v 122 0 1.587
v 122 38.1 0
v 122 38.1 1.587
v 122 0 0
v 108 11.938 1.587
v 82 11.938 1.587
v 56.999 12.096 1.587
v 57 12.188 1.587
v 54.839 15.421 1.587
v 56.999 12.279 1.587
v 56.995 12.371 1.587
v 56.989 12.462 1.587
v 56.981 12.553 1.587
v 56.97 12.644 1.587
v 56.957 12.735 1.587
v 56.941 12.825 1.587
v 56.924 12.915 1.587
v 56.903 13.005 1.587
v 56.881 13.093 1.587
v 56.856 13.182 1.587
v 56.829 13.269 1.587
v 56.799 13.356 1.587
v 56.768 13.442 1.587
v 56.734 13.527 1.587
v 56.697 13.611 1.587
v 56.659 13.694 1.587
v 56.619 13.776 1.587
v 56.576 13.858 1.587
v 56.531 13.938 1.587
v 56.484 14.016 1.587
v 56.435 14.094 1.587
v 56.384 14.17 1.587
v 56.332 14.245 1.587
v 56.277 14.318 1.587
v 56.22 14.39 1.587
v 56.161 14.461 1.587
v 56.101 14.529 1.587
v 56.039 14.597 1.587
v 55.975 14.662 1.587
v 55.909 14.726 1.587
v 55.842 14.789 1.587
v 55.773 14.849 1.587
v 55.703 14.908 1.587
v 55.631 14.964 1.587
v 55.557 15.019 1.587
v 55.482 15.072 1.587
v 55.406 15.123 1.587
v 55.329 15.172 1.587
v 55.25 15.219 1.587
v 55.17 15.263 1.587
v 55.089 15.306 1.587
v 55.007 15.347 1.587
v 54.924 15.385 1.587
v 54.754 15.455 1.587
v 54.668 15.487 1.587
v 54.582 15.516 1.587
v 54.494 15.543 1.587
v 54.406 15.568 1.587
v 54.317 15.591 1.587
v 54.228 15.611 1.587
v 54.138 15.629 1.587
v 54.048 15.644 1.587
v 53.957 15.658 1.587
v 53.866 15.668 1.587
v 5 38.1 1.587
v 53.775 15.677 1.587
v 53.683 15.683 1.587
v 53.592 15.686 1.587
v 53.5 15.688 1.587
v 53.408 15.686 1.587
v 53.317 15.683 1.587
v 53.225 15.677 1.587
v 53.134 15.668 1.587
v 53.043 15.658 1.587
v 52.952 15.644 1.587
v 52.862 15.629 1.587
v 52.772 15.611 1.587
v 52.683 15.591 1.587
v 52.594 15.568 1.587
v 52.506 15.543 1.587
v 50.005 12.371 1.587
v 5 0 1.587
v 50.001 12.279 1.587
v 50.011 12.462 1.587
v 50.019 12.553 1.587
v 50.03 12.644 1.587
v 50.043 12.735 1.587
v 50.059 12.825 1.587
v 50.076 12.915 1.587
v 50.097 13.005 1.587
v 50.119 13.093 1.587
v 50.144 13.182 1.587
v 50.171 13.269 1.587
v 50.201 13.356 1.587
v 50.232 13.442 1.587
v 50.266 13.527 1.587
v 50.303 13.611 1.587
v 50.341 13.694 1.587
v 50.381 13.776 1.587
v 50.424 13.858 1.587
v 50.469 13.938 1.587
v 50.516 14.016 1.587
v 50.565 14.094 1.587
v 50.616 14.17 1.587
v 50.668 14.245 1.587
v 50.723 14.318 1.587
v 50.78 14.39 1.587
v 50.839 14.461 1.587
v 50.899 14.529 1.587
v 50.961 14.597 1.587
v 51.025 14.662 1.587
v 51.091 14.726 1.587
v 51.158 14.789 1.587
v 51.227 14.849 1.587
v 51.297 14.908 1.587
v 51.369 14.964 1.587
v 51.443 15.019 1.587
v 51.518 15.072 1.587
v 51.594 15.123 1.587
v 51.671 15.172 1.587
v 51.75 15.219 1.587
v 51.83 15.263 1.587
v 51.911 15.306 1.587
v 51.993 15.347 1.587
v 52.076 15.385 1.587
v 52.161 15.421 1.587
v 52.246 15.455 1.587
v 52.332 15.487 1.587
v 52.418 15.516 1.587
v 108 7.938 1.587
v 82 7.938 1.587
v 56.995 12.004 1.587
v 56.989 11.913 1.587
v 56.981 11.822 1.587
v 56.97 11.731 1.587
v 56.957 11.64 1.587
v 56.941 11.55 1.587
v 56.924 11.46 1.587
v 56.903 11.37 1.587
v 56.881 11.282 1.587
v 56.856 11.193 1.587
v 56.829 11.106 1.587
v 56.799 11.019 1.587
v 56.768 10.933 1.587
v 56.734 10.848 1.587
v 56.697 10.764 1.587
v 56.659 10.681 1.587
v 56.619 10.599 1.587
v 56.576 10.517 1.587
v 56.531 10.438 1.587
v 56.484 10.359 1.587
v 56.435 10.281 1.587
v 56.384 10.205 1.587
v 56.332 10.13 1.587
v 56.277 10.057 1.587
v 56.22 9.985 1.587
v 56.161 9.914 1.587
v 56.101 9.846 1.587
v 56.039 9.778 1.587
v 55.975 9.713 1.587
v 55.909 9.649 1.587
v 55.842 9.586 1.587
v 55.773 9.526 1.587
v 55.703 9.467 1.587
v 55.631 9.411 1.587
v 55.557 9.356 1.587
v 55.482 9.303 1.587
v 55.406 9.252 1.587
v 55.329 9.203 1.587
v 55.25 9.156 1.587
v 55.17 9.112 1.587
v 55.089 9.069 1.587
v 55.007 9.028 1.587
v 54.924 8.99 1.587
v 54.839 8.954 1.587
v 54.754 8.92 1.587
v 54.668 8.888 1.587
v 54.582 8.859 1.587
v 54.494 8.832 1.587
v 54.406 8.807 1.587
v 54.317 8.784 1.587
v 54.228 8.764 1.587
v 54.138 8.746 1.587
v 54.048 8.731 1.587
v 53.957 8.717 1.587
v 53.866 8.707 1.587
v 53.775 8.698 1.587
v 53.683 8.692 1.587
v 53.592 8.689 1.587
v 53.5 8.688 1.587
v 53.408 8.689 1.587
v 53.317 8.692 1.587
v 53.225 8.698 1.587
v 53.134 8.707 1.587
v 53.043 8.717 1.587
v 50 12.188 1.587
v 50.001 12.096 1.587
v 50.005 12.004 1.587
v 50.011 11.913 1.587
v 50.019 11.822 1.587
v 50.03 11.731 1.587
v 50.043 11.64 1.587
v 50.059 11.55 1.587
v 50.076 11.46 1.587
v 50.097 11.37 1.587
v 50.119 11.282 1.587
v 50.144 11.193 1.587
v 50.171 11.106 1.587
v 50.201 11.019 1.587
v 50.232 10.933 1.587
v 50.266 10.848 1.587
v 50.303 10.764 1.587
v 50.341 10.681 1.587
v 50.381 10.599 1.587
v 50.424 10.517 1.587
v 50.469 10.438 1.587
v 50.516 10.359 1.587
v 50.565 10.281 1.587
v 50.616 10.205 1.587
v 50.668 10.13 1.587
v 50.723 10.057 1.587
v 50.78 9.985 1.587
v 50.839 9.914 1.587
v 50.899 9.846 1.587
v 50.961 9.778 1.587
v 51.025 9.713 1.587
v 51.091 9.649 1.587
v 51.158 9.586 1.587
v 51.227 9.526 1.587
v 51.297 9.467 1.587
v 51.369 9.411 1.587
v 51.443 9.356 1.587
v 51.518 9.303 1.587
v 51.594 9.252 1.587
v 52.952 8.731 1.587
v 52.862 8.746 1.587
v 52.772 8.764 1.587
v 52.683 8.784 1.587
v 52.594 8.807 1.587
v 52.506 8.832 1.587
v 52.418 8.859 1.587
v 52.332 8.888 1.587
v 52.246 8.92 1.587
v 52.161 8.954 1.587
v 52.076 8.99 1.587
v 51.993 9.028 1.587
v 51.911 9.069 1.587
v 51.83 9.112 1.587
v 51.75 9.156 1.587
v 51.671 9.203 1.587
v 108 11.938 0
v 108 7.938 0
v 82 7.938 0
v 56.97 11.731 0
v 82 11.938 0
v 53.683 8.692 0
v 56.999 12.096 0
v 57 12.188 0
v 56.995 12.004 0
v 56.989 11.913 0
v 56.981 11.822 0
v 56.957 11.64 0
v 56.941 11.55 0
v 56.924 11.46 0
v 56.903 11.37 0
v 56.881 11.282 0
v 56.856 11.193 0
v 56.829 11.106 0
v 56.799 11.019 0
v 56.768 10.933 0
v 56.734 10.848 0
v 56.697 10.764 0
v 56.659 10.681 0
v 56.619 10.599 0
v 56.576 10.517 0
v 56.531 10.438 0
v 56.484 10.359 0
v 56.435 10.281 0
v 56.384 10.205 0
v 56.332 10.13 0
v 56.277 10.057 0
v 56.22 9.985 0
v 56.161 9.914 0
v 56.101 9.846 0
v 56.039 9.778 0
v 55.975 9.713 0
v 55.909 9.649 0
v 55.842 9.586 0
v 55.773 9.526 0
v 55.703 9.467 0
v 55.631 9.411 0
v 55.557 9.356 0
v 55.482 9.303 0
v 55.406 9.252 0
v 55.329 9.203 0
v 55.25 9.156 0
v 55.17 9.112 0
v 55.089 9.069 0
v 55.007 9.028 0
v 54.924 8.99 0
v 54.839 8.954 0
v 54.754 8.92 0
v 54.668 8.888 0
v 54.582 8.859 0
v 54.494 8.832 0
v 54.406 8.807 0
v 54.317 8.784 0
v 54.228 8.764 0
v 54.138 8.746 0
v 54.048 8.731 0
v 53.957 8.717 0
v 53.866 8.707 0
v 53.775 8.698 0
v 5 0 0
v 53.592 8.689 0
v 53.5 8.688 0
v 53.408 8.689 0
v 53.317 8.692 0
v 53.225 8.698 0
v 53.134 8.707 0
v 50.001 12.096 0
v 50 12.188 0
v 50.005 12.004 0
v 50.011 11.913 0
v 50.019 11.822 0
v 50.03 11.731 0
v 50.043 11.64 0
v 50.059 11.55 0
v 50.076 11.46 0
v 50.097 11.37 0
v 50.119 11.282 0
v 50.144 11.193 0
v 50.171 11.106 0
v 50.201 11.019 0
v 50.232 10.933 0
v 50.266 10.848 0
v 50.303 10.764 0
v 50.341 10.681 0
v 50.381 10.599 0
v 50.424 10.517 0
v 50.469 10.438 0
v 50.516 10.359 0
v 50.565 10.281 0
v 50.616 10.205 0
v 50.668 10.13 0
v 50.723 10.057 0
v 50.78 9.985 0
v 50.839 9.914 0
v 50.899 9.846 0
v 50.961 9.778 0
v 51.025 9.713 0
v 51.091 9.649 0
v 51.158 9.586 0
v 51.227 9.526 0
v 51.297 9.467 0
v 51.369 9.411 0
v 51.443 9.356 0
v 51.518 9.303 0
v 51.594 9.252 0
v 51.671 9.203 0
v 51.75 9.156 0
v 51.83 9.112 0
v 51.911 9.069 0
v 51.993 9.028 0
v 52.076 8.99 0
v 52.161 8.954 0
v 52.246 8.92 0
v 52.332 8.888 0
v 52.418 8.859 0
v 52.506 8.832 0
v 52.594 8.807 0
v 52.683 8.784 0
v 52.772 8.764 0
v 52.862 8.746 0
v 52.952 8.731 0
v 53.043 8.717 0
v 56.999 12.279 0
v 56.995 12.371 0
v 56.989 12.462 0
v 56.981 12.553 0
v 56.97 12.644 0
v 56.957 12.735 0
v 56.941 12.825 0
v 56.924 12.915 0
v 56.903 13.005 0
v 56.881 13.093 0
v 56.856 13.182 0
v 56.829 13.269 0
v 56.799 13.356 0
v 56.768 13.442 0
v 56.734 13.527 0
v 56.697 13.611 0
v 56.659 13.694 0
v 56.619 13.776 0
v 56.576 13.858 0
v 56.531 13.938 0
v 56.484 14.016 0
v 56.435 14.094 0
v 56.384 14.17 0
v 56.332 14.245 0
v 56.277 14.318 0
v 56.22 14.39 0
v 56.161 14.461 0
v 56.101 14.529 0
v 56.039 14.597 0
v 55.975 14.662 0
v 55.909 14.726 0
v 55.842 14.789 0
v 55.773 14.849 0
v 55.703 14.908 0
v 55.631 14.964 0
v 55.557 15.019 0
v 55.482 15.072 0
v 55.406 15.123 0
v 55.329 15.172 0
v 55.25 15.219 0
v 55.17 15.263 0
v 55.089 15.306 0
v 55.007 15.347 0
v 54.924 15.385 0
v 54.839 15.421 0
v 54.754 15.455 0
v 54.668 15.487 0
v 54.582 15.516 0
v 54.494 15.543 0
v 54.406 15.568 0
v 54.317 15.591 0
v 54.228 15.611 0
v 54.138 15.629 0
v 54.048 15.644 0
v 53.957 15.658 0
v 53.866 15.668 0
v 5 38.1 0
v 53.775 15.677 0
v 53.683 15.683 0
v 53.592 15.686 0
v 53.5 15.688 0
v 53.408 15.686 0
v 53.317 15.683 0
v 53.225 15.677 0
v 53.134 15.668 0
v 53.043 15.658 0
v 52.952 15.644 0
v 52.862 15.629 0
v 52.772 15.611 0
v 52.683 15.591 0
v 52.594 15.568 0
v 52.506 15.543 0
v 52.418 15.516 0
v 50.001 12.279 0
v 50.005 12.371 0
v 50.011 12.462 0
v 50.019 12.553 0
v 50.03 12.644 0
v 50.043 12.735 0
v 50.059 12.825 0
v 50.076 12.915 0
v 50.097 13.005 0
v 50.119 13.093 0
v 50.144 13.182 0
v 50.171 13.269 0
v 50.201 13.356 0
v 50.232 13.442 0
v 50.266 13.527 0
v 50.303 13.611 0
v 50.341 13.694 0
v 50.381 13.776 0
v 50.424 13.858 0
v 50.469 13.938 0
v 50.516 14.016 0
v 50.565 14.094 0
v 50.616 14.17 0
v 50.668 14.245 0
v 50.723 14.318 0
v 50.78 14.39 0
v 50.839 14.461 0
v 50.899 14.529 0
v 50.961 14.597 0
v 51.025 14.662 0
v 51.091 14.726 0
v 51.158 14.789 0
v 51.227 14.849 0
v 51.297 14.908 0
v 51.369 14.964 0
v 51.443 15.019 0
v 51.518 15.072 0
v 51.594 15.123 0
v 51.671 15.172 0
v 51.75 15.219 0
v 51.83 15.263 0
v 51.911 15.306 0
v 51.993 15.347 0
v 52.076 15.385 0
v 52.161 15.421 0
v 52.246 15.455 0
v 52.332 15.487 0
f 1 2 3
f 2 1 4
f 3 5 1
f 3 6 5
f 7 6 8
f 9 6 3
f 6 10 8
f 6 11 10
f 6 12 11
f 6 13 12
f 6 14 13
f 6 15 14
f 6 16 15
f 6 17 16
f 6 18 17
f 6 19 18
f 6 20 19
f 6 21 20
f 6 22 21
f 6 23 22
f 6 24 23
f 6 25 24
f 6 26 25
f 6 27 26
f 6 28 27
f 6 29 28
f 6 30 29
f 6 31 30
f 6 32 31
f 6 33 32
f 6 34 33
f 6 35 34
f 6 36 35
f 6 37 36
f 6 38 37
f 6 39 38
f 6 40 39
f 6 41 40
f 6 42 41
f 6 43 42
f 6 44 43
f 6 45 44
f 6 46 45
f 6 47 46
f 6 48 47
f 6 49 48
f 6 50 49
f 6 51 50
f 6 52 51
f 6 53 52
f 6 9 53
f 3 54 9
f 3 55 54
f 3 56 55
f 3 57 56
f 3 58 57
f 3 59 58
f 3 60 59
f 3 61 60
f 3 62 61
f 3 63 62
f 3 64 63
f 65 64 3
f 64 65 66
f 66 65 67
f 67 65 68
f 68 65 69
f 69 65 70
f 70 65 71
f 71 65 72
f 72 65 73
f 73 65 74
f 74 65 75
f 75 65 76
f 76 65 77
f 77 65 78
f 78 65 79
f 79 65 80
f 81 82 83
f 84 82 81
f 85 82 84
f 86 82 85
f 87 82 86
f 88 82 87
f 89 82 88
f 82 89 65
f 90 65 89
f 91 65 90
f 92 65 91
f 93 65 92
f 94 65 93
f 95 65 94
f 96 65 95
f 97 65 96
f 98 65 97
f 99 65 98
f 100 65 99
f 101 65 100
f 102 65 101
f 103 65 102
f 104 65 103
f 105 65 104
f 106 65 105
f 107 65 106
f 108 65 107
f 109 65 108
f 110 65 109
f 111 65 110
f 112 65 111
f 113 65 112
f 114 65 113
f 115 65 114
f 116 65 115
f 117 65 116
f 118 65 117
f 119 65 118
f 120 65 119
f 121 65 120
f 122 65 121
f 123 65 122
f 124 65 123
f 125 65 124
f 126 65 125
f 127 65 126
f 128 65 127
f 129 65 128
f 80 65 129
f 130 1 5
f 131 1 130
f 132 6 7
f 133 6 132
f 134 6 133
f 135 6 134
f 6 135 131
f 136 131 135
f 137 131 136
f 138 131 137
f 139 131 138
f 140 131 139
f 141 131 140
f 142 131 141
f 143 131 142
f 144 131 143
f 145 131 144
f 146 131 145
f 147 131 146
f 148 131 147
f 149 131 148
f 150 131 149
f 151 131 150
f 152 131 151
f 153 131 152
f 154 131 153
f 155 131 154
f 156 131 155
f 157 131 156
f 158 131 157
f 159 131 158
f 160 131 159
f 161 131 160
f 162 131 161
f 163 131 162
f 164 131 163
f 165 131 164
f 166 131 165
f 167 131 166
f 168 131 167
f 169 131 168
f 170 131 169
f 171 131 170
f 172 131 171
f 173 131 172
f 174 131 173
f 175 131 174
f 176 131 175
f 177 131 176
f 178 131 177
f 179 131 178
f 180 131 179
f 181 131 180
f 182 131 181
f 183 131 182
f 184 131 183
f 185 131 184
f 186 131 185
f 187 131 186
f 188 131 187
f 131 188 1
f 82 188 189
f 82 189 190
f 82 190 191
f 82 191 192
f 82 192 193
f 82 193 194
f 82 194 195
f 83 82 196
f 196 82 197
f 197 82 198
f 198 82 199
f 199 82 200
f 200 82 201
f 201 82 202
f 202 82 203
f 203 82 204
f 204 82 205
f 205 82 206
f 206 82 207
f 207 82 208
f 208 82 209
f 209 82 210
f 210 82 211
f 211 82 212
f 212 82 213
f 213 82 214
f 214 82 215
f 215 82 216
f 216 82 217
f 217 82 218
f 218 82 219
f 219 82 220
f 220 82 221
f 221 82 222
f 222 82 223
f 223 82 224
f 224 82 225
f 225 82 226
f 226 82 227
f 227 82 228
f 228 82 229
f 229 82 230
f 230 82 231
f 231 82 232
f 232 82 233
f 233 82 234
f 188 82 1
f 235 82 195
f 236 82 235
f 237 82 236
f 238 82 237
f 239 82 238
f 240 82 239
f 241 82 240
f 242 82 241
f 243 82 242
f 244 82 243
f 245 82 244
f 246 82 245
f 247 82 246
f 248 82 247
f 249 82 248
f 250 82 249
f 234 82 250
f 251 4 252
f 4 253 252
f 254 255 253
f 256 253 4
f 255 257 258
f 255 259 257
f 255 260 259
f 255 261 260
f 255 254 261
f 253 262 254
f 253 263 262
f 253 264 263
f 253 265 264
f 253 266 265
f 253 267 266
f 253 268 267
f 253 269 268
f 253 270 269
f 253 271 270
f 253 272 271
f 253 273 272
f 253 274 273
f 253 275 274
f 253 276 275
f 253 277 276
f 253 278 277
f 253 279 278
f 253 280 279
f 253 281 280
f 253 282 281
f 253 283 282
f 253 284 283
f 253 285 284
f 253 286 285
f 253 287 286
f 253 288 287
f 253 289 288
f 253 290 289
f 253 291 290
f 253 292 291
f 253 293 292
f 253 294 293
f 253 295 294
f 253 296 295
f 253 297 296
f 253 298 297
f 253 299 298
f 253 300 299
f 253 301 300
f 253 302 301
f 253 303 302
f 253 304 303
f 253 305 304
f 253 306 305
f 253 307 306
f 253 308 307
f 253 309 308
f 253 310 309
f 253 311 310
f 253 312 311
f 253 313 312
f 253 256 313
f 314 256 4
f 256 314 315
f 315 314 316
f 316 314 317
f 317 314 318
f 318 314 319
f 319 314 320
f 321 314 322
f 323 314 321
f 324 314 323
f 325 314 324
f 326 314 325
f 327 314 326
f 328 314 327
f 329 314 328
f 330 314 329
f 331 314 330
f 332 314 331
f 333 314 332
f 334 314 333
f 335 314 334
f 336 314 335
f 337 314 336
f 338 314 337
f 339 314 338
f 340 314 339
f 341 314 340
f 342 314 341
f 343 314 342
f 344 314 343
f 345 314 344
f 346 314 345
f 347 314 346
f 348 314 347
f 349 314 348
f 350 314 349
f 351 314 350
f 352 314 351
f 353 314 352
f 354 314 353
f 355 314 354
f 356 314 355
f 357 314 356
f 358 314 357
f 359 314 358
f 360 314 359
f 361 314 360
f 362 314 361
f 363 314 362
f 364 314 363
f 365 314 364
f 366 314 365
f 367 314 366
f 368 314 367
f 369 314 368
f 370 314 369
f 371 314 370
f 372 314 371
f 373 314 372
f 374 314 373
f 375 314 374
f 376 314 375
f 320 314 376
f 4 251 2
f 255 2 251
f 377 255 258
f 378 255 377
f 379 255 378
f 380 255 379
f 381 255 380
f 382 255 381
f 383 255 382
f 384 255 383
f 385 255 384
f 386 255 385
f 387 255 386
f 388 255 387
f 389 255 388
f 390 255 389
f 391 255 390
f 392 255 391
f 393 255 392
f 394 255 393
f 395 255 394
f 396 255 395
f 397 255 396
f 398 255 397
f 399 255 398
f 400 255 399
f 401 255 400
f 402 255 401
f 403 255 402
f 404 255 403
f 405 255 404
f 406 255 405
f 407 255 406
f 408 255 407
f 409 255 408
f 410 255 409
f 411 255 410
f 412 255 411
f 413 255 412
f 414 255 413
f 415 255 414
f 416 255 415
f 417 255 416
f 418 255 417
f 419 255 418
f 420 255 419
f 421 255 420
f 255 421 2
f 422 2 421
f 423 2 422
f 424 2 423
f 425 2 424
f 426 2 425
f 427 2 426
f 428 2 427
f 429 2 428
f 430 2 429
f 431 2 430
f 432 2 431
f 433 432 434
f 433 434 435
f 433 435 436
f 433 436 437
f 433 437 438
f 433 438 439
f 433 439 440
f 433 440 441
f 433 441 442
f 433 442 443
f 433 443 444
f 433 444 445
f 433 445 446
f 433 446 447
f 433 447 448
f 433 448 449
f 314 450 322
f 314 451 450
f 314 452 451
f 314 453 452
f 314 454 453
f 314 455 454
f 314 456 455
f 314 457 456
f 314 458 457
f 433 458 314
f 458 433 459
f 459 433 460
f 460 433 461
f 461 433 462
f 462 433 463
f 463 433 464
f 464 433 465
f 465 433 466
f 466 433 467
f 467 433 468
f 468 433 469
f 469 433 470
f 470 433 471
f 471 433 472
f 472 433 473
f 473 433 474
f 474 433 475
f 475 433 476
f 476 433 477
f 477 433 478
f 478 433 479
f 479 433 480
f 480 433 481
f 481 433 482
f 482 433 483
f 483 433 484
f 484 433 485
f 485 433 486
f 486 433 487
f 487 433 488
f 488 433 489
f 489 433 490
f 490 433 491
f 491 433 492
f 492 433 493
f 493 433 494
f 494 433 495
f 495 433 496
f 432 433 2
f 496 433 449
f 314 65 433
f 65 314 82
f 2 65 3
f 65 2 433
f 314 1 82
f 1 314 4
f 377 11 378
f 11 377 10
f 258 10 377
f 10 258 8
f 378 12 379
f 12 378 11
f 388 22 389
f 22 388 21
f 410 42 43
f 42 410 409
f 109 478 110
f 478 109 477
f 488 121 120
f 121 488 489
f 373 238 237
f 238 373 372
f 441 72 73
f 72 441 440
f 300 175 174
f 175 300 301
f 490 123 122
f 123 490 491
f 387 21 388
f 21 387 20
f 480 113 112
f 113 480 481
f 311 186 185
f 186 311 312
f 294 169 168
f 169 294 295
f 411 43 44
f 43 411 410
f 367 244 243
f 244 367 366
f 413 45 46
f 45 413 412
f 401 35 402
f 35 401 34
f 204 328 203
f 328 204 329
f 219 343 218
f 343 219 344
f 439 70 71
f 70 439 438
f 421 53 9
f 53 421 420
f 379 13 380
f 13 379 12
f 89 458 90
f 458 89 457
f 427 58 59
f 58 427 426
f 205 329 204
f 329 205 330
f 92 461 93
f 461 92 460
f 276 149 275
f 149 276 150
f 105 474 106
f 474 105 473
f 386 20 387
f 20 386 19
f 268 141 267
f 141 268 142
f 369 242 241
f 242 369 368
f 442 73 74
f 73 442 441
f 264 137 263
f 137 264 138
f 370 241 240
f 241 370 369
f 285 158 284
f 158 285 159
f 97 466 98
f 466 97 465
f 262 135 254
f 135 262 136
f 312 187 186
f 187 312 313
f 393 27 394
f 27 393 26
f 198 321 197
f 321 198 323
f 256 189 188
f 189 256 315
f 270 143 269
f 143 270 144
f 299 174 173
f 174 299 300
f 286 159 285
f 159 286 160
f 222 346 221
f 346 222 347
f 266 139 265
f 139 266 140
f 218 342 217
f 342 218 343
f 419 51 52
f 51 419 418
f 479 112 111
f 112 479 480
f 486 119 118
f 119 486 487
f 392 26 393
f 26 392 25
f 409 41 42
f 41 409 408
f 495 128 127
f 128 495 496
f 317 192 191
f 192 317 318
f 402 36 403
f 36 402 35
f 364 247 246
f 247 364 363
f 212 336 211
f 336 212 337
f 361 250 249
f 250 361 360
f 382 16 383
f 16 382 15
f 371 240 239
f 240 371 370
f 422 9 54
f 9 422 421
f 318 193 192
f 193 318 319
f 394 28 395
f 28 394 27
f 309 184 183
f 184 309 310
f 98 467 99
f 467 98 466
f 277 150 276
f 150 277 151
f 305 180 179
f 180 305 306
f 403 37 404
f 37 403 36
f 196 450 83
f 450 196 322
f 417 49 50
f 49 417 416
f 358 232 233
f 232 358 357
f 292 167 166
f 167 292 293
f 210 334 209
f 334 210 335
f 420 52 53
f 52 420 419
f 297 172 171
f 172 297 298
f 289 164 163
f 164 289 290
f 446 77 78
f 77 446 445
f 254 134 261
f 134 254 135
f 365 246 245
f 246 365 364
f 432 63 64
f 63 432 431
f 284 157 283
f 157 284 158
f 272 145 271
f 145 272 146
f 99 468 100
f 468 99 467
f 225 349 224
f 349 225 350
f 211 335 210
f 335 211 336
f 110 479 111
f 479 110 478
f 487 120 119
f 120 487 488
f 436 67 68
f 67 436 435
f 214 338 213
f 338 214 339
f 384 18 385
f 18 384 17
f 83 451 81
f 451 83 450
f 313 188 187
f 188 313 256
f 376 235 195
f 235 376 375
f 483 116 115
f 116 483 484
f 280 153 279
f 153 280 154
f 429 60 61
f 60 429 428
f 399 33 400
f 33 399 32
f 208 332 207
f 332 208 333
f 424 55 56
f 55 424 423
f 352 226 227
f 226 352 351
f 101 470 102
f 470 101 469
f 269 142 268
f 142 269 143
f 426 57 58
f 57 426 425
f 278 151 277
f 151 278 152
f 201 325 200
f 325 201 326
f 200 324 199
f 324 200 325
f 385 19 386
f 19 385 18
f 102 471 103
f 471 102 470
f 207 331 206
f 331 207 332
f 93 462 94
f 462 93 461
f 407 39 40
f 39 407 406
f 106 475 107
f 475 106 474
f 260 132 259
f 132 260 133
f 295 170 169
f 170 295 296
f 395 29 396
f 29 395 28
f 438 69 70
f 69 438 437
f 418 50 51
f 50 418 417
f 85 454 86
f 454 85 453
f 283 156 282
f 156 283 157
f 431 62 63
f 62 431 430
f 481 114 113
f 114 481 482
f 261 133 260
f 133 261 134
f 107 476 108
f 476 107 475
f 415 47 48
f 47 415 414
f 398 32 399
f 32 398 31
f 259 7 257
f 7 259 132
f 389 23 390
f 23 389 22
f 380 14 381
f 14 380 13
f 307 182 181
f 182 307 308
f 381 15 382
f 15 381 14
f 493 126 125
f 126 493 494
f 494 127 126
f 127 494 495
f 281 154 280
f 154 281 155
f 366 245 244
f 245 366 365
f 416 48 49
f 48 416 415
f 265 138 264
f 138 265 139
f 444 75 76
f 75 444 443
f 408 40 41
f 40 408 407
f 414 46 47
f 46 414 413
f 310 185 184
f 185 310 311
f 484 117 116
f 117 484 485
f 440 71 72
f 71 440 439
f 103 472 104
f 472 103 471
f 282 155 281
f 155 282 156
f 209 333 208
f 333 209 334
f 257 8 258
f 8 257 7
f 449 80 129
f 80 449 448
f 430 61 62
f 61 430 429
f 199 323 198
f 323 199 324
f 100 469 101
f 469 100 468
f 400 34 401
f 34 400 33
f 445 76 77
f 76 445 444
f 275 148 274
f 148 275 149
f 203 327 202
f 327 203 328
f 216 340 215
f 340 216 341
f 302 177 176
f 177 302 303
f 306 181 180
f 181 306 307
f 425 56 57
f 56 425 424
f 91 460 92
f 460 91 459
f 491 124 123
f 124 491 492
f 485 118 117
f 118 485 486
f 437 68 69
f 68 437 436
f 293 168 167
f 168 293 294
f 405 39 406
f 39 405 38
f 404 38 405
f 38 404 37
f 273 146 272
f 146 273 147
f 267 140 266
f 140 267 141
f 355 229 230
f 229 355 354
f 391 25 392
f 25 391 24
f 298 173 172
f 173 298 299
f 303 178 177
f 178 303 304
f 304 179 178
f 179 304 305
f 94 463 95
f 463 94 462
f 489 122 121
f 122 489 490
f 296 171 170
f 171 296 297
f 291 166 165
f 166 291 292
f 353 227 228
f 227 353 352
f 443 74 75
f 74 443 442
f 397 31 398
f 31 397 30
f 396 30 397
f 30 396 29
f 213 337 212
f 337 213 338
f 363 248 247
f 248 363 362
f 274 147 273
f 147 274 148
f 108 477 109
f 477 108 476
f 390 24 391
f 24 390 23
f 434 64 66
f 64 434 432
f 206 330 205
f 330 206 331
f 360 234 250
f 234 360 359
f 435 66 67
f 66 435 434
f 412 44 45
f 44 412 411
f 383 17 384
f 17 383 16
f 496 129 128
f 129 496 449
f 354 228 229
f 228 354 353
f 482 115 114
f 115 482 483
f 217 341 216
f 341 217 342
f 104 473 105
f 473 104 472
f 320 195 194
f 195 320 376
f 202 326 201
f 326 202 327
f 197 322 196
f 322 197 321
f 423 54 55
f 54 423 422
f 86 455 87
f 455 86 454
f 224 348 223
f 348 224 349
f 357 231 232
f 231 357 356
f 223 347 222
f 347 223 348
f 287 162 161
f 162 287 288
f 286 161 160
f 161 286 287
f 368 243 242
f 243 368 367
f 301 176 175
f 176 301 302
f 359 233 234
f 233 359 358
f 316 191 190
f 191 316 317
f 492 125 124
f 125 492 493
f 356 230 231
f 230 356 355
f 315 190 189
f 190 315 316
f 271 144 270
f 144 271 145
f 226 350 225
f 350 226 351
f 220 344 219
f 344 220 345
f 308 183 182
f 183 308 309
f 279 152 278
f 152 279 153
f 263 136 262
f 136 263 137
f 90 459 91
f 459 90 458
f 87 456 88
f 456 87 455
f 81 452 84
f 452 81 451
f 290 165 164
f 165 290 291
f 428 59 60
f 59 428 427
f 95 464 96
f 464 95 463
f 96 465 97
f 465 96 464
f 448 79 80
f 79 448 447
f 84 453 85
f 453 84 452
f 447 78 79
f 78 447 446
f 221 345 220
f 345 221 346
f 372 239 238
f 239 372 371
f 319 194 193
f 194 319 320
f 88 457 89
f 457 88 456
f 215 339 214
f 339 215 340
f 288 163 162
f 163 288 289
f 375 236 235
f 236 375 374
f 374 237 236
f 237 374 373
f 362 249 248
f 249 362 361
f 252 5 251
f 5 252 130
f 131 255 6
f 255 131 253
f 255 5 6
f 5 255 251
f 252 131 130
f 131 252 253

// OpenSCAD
inch=25.4;

fineness_stl=240;
fineness_low=40;

build_stl=1;

fineness=build_stl?fineness_stl:fineness_low;


tegra_length=5*inch;
tegra_width=5*inch;
tegra_height=1.5*inch;

//shell_thickness=1/16*inch;


module serial_cutout(shell_thickness){
    linear_extrude(shell_thickness+0.002,convexity=10)
    offset(delta=0.5)
    serial_shape();
    /*
    polygon(
    points=[
    [0,1/8*inch],
    [3/16*inch+1.5,1/8*inch],
    [3/16*inch+1.5,1/16*inch],
    [1*inch+1.5,1/16*inch],
    [1*inch+1.5,1/8*inch],
    [(1+3/16)*inch+3,1/8*inch],
    [(1+3/16)*inch+3,7/16*inch],
    [1*inch+1.5,7/16*inch],
    [1*inch+1.5,1/2*inch],
    [3/16*inch+1.5,1/2*inch],
    [3/16*inch+1.5,7/16*inch],
    [0,7/16*inch]
    ]);
    */
}

module hdmi_cutout(shell_thickness){
    linear_extrude(shell_thickness+0.002,convexity=10)
    offset(delta=0.5)
    polygon(
    points=[
    [0,2],
    [1,2],
    [2,1],
    [13,1],
    [14,2],
    [15,2],
    [15,6],
    [0,6]
    ]);
}

module usb_cutout(shell_thickness){
    linear_extrude(shell_thickness+0.002,convexity=10)
    offset(delta=0.5)
    square(size=[6,14]);
}

module eth_cutout(shell_thickness){
    linear_extrude(shell_thickness+0.002,convexity=10)
    offset(delta=0.5)
    square(size=[16,13.5]);
}

module sound_cutout(shell_thickness){
    translate([0,6,0])
    linear_extrude(shell_thickness+0.002,convexity=10)
    offset(delta=0.5)
    circle(3.5,$fn=fineness);
    
    translate([0,18.5,0])
    linear_extrude(shell_thickness+0.002,convexity=10)
    offset(delta=0.5)
    circle(3.5,$fn=fineness);
}

module usb_mini(shell_thickness){
    translate([0,-0.5,0])
    linear_extrude(shell_thickness+0.002,convexity=10)
    offset(delta=0.5)
    square(size=[8,3]);
}


module jtag_cutout(shell_thickness){
    linear_extrude(shell_thickness+0.002,convexity=10)
    polygon(points=[[0,0],[34,0],[34,10],[0,10],[0,0]]);
}

module power_cutout(shell_thickness){
 cylinder(shell_thickness+0.002,3.5,3.5,$fn=240);   
}

module sdcard_cutout(shell_thickness){
 cube([26,4,shell_thickness+0.002]);   
}

module tegra_io_panel(shell_thickness){
    translate([5,0,0])
    cube(size=[tegra_length-10,tegra_height,shell_thickness]);
}

module tegra_front_panel(){
    
    difference(){
        tegra_io_panel(1/16*inch);
        translate([8,5/16*inch,-0.001])
        serial_cutout(1/16*inch);
        translate([44,5/16*inch,-0.001])
        hdmi_cutout(1/16*inch);
        
        translate([65,5/16*inch,-0.001])
        usb_cutout(1/16*inch);
        
        translate([74,5/16*inch,-0.001])
        eth_cutout(1/16*inch);
        
        translate([99.5,5/16*inch,-0.001])
        sound_cutout(1/16*inch);
        
        translate([108.5,5/16*inch,-0.001])
        usb_mini(1/16*inch);
    }
}

module tegra_jtag_panel(){
    difference(){
        tegra_io_panel(1/16*inch);
        
        translate([10,5/16*inch,-0.001])
        jtag_cutout(1/16*inch);
    }
}

module tegra_rear_panel(){
    difference(){
        tegra_io_panel(1/16*inch);
        
        translate([53.5,4.25+5/16*inch,-0.001])
        power_cutout(1/16*inch);
        
        translate([82,5/16*inch,-0.001])
        sdcard_cutout(1/16*inch);
    }
}


//tegra_front_panel();
//tegra_jtag_panel();
tegra_rear_panel();



module serial_shape(){
    /*
    polygon(
    points=[
    [0,1/8*inch],
    [3/16*inch+1.5,1/8*inch],
    [3/16*inch+1.5,1/16*inch],
    [1*inch+1.5,1/16*inch],
    [1*inch+1.5,1/8*inch],
    [(1+3/16)*inch+3,1/8*inch],
    [(1+3/16)*inch+3,7/16*inch],
    [1*inch+1.5,7/16*inch],
    [1*inch+1.5,1/2*inch],
    [3/16*inch+1.5,1/2*inch],
    [3/16*inch+1.5,7/16*inch],
    [0,7/16*inch]
    ]);
    */
    union(){
        hull(){
            translate([1.5+7.5,9,0])
            circle(2.5,$fn=fineness);
            translate([1.5+21.5,9,0])
            circle(2.5,$fn=fineness);
            
            translate([1.5+8.5,4.5,0])
            circle(2.5,$fn=fineness);
            translate([1.5+20.5,4.5,0])
            circle(2.5,$fn=fineness);
        }
        
        hull(){
            translate([3,6.75,0])
            circle(3,$fn=fineness);
            translate([29,6.75,0])
            circle(3,$fn=fineness);
        }
        
    }
}

module serial_test(){
    difference(){
        translate([0,0,-0.001])
        linear_extrude(shell_thickness+0.002)
        offset(delta=2.5)
        serial_shape();
        
        translate([0,0,-0.002])
        linear_extrude(shell_thickness+0.004)
        offset(delta=0.5)
        serial_shape();
    }
}

//serial_test();
